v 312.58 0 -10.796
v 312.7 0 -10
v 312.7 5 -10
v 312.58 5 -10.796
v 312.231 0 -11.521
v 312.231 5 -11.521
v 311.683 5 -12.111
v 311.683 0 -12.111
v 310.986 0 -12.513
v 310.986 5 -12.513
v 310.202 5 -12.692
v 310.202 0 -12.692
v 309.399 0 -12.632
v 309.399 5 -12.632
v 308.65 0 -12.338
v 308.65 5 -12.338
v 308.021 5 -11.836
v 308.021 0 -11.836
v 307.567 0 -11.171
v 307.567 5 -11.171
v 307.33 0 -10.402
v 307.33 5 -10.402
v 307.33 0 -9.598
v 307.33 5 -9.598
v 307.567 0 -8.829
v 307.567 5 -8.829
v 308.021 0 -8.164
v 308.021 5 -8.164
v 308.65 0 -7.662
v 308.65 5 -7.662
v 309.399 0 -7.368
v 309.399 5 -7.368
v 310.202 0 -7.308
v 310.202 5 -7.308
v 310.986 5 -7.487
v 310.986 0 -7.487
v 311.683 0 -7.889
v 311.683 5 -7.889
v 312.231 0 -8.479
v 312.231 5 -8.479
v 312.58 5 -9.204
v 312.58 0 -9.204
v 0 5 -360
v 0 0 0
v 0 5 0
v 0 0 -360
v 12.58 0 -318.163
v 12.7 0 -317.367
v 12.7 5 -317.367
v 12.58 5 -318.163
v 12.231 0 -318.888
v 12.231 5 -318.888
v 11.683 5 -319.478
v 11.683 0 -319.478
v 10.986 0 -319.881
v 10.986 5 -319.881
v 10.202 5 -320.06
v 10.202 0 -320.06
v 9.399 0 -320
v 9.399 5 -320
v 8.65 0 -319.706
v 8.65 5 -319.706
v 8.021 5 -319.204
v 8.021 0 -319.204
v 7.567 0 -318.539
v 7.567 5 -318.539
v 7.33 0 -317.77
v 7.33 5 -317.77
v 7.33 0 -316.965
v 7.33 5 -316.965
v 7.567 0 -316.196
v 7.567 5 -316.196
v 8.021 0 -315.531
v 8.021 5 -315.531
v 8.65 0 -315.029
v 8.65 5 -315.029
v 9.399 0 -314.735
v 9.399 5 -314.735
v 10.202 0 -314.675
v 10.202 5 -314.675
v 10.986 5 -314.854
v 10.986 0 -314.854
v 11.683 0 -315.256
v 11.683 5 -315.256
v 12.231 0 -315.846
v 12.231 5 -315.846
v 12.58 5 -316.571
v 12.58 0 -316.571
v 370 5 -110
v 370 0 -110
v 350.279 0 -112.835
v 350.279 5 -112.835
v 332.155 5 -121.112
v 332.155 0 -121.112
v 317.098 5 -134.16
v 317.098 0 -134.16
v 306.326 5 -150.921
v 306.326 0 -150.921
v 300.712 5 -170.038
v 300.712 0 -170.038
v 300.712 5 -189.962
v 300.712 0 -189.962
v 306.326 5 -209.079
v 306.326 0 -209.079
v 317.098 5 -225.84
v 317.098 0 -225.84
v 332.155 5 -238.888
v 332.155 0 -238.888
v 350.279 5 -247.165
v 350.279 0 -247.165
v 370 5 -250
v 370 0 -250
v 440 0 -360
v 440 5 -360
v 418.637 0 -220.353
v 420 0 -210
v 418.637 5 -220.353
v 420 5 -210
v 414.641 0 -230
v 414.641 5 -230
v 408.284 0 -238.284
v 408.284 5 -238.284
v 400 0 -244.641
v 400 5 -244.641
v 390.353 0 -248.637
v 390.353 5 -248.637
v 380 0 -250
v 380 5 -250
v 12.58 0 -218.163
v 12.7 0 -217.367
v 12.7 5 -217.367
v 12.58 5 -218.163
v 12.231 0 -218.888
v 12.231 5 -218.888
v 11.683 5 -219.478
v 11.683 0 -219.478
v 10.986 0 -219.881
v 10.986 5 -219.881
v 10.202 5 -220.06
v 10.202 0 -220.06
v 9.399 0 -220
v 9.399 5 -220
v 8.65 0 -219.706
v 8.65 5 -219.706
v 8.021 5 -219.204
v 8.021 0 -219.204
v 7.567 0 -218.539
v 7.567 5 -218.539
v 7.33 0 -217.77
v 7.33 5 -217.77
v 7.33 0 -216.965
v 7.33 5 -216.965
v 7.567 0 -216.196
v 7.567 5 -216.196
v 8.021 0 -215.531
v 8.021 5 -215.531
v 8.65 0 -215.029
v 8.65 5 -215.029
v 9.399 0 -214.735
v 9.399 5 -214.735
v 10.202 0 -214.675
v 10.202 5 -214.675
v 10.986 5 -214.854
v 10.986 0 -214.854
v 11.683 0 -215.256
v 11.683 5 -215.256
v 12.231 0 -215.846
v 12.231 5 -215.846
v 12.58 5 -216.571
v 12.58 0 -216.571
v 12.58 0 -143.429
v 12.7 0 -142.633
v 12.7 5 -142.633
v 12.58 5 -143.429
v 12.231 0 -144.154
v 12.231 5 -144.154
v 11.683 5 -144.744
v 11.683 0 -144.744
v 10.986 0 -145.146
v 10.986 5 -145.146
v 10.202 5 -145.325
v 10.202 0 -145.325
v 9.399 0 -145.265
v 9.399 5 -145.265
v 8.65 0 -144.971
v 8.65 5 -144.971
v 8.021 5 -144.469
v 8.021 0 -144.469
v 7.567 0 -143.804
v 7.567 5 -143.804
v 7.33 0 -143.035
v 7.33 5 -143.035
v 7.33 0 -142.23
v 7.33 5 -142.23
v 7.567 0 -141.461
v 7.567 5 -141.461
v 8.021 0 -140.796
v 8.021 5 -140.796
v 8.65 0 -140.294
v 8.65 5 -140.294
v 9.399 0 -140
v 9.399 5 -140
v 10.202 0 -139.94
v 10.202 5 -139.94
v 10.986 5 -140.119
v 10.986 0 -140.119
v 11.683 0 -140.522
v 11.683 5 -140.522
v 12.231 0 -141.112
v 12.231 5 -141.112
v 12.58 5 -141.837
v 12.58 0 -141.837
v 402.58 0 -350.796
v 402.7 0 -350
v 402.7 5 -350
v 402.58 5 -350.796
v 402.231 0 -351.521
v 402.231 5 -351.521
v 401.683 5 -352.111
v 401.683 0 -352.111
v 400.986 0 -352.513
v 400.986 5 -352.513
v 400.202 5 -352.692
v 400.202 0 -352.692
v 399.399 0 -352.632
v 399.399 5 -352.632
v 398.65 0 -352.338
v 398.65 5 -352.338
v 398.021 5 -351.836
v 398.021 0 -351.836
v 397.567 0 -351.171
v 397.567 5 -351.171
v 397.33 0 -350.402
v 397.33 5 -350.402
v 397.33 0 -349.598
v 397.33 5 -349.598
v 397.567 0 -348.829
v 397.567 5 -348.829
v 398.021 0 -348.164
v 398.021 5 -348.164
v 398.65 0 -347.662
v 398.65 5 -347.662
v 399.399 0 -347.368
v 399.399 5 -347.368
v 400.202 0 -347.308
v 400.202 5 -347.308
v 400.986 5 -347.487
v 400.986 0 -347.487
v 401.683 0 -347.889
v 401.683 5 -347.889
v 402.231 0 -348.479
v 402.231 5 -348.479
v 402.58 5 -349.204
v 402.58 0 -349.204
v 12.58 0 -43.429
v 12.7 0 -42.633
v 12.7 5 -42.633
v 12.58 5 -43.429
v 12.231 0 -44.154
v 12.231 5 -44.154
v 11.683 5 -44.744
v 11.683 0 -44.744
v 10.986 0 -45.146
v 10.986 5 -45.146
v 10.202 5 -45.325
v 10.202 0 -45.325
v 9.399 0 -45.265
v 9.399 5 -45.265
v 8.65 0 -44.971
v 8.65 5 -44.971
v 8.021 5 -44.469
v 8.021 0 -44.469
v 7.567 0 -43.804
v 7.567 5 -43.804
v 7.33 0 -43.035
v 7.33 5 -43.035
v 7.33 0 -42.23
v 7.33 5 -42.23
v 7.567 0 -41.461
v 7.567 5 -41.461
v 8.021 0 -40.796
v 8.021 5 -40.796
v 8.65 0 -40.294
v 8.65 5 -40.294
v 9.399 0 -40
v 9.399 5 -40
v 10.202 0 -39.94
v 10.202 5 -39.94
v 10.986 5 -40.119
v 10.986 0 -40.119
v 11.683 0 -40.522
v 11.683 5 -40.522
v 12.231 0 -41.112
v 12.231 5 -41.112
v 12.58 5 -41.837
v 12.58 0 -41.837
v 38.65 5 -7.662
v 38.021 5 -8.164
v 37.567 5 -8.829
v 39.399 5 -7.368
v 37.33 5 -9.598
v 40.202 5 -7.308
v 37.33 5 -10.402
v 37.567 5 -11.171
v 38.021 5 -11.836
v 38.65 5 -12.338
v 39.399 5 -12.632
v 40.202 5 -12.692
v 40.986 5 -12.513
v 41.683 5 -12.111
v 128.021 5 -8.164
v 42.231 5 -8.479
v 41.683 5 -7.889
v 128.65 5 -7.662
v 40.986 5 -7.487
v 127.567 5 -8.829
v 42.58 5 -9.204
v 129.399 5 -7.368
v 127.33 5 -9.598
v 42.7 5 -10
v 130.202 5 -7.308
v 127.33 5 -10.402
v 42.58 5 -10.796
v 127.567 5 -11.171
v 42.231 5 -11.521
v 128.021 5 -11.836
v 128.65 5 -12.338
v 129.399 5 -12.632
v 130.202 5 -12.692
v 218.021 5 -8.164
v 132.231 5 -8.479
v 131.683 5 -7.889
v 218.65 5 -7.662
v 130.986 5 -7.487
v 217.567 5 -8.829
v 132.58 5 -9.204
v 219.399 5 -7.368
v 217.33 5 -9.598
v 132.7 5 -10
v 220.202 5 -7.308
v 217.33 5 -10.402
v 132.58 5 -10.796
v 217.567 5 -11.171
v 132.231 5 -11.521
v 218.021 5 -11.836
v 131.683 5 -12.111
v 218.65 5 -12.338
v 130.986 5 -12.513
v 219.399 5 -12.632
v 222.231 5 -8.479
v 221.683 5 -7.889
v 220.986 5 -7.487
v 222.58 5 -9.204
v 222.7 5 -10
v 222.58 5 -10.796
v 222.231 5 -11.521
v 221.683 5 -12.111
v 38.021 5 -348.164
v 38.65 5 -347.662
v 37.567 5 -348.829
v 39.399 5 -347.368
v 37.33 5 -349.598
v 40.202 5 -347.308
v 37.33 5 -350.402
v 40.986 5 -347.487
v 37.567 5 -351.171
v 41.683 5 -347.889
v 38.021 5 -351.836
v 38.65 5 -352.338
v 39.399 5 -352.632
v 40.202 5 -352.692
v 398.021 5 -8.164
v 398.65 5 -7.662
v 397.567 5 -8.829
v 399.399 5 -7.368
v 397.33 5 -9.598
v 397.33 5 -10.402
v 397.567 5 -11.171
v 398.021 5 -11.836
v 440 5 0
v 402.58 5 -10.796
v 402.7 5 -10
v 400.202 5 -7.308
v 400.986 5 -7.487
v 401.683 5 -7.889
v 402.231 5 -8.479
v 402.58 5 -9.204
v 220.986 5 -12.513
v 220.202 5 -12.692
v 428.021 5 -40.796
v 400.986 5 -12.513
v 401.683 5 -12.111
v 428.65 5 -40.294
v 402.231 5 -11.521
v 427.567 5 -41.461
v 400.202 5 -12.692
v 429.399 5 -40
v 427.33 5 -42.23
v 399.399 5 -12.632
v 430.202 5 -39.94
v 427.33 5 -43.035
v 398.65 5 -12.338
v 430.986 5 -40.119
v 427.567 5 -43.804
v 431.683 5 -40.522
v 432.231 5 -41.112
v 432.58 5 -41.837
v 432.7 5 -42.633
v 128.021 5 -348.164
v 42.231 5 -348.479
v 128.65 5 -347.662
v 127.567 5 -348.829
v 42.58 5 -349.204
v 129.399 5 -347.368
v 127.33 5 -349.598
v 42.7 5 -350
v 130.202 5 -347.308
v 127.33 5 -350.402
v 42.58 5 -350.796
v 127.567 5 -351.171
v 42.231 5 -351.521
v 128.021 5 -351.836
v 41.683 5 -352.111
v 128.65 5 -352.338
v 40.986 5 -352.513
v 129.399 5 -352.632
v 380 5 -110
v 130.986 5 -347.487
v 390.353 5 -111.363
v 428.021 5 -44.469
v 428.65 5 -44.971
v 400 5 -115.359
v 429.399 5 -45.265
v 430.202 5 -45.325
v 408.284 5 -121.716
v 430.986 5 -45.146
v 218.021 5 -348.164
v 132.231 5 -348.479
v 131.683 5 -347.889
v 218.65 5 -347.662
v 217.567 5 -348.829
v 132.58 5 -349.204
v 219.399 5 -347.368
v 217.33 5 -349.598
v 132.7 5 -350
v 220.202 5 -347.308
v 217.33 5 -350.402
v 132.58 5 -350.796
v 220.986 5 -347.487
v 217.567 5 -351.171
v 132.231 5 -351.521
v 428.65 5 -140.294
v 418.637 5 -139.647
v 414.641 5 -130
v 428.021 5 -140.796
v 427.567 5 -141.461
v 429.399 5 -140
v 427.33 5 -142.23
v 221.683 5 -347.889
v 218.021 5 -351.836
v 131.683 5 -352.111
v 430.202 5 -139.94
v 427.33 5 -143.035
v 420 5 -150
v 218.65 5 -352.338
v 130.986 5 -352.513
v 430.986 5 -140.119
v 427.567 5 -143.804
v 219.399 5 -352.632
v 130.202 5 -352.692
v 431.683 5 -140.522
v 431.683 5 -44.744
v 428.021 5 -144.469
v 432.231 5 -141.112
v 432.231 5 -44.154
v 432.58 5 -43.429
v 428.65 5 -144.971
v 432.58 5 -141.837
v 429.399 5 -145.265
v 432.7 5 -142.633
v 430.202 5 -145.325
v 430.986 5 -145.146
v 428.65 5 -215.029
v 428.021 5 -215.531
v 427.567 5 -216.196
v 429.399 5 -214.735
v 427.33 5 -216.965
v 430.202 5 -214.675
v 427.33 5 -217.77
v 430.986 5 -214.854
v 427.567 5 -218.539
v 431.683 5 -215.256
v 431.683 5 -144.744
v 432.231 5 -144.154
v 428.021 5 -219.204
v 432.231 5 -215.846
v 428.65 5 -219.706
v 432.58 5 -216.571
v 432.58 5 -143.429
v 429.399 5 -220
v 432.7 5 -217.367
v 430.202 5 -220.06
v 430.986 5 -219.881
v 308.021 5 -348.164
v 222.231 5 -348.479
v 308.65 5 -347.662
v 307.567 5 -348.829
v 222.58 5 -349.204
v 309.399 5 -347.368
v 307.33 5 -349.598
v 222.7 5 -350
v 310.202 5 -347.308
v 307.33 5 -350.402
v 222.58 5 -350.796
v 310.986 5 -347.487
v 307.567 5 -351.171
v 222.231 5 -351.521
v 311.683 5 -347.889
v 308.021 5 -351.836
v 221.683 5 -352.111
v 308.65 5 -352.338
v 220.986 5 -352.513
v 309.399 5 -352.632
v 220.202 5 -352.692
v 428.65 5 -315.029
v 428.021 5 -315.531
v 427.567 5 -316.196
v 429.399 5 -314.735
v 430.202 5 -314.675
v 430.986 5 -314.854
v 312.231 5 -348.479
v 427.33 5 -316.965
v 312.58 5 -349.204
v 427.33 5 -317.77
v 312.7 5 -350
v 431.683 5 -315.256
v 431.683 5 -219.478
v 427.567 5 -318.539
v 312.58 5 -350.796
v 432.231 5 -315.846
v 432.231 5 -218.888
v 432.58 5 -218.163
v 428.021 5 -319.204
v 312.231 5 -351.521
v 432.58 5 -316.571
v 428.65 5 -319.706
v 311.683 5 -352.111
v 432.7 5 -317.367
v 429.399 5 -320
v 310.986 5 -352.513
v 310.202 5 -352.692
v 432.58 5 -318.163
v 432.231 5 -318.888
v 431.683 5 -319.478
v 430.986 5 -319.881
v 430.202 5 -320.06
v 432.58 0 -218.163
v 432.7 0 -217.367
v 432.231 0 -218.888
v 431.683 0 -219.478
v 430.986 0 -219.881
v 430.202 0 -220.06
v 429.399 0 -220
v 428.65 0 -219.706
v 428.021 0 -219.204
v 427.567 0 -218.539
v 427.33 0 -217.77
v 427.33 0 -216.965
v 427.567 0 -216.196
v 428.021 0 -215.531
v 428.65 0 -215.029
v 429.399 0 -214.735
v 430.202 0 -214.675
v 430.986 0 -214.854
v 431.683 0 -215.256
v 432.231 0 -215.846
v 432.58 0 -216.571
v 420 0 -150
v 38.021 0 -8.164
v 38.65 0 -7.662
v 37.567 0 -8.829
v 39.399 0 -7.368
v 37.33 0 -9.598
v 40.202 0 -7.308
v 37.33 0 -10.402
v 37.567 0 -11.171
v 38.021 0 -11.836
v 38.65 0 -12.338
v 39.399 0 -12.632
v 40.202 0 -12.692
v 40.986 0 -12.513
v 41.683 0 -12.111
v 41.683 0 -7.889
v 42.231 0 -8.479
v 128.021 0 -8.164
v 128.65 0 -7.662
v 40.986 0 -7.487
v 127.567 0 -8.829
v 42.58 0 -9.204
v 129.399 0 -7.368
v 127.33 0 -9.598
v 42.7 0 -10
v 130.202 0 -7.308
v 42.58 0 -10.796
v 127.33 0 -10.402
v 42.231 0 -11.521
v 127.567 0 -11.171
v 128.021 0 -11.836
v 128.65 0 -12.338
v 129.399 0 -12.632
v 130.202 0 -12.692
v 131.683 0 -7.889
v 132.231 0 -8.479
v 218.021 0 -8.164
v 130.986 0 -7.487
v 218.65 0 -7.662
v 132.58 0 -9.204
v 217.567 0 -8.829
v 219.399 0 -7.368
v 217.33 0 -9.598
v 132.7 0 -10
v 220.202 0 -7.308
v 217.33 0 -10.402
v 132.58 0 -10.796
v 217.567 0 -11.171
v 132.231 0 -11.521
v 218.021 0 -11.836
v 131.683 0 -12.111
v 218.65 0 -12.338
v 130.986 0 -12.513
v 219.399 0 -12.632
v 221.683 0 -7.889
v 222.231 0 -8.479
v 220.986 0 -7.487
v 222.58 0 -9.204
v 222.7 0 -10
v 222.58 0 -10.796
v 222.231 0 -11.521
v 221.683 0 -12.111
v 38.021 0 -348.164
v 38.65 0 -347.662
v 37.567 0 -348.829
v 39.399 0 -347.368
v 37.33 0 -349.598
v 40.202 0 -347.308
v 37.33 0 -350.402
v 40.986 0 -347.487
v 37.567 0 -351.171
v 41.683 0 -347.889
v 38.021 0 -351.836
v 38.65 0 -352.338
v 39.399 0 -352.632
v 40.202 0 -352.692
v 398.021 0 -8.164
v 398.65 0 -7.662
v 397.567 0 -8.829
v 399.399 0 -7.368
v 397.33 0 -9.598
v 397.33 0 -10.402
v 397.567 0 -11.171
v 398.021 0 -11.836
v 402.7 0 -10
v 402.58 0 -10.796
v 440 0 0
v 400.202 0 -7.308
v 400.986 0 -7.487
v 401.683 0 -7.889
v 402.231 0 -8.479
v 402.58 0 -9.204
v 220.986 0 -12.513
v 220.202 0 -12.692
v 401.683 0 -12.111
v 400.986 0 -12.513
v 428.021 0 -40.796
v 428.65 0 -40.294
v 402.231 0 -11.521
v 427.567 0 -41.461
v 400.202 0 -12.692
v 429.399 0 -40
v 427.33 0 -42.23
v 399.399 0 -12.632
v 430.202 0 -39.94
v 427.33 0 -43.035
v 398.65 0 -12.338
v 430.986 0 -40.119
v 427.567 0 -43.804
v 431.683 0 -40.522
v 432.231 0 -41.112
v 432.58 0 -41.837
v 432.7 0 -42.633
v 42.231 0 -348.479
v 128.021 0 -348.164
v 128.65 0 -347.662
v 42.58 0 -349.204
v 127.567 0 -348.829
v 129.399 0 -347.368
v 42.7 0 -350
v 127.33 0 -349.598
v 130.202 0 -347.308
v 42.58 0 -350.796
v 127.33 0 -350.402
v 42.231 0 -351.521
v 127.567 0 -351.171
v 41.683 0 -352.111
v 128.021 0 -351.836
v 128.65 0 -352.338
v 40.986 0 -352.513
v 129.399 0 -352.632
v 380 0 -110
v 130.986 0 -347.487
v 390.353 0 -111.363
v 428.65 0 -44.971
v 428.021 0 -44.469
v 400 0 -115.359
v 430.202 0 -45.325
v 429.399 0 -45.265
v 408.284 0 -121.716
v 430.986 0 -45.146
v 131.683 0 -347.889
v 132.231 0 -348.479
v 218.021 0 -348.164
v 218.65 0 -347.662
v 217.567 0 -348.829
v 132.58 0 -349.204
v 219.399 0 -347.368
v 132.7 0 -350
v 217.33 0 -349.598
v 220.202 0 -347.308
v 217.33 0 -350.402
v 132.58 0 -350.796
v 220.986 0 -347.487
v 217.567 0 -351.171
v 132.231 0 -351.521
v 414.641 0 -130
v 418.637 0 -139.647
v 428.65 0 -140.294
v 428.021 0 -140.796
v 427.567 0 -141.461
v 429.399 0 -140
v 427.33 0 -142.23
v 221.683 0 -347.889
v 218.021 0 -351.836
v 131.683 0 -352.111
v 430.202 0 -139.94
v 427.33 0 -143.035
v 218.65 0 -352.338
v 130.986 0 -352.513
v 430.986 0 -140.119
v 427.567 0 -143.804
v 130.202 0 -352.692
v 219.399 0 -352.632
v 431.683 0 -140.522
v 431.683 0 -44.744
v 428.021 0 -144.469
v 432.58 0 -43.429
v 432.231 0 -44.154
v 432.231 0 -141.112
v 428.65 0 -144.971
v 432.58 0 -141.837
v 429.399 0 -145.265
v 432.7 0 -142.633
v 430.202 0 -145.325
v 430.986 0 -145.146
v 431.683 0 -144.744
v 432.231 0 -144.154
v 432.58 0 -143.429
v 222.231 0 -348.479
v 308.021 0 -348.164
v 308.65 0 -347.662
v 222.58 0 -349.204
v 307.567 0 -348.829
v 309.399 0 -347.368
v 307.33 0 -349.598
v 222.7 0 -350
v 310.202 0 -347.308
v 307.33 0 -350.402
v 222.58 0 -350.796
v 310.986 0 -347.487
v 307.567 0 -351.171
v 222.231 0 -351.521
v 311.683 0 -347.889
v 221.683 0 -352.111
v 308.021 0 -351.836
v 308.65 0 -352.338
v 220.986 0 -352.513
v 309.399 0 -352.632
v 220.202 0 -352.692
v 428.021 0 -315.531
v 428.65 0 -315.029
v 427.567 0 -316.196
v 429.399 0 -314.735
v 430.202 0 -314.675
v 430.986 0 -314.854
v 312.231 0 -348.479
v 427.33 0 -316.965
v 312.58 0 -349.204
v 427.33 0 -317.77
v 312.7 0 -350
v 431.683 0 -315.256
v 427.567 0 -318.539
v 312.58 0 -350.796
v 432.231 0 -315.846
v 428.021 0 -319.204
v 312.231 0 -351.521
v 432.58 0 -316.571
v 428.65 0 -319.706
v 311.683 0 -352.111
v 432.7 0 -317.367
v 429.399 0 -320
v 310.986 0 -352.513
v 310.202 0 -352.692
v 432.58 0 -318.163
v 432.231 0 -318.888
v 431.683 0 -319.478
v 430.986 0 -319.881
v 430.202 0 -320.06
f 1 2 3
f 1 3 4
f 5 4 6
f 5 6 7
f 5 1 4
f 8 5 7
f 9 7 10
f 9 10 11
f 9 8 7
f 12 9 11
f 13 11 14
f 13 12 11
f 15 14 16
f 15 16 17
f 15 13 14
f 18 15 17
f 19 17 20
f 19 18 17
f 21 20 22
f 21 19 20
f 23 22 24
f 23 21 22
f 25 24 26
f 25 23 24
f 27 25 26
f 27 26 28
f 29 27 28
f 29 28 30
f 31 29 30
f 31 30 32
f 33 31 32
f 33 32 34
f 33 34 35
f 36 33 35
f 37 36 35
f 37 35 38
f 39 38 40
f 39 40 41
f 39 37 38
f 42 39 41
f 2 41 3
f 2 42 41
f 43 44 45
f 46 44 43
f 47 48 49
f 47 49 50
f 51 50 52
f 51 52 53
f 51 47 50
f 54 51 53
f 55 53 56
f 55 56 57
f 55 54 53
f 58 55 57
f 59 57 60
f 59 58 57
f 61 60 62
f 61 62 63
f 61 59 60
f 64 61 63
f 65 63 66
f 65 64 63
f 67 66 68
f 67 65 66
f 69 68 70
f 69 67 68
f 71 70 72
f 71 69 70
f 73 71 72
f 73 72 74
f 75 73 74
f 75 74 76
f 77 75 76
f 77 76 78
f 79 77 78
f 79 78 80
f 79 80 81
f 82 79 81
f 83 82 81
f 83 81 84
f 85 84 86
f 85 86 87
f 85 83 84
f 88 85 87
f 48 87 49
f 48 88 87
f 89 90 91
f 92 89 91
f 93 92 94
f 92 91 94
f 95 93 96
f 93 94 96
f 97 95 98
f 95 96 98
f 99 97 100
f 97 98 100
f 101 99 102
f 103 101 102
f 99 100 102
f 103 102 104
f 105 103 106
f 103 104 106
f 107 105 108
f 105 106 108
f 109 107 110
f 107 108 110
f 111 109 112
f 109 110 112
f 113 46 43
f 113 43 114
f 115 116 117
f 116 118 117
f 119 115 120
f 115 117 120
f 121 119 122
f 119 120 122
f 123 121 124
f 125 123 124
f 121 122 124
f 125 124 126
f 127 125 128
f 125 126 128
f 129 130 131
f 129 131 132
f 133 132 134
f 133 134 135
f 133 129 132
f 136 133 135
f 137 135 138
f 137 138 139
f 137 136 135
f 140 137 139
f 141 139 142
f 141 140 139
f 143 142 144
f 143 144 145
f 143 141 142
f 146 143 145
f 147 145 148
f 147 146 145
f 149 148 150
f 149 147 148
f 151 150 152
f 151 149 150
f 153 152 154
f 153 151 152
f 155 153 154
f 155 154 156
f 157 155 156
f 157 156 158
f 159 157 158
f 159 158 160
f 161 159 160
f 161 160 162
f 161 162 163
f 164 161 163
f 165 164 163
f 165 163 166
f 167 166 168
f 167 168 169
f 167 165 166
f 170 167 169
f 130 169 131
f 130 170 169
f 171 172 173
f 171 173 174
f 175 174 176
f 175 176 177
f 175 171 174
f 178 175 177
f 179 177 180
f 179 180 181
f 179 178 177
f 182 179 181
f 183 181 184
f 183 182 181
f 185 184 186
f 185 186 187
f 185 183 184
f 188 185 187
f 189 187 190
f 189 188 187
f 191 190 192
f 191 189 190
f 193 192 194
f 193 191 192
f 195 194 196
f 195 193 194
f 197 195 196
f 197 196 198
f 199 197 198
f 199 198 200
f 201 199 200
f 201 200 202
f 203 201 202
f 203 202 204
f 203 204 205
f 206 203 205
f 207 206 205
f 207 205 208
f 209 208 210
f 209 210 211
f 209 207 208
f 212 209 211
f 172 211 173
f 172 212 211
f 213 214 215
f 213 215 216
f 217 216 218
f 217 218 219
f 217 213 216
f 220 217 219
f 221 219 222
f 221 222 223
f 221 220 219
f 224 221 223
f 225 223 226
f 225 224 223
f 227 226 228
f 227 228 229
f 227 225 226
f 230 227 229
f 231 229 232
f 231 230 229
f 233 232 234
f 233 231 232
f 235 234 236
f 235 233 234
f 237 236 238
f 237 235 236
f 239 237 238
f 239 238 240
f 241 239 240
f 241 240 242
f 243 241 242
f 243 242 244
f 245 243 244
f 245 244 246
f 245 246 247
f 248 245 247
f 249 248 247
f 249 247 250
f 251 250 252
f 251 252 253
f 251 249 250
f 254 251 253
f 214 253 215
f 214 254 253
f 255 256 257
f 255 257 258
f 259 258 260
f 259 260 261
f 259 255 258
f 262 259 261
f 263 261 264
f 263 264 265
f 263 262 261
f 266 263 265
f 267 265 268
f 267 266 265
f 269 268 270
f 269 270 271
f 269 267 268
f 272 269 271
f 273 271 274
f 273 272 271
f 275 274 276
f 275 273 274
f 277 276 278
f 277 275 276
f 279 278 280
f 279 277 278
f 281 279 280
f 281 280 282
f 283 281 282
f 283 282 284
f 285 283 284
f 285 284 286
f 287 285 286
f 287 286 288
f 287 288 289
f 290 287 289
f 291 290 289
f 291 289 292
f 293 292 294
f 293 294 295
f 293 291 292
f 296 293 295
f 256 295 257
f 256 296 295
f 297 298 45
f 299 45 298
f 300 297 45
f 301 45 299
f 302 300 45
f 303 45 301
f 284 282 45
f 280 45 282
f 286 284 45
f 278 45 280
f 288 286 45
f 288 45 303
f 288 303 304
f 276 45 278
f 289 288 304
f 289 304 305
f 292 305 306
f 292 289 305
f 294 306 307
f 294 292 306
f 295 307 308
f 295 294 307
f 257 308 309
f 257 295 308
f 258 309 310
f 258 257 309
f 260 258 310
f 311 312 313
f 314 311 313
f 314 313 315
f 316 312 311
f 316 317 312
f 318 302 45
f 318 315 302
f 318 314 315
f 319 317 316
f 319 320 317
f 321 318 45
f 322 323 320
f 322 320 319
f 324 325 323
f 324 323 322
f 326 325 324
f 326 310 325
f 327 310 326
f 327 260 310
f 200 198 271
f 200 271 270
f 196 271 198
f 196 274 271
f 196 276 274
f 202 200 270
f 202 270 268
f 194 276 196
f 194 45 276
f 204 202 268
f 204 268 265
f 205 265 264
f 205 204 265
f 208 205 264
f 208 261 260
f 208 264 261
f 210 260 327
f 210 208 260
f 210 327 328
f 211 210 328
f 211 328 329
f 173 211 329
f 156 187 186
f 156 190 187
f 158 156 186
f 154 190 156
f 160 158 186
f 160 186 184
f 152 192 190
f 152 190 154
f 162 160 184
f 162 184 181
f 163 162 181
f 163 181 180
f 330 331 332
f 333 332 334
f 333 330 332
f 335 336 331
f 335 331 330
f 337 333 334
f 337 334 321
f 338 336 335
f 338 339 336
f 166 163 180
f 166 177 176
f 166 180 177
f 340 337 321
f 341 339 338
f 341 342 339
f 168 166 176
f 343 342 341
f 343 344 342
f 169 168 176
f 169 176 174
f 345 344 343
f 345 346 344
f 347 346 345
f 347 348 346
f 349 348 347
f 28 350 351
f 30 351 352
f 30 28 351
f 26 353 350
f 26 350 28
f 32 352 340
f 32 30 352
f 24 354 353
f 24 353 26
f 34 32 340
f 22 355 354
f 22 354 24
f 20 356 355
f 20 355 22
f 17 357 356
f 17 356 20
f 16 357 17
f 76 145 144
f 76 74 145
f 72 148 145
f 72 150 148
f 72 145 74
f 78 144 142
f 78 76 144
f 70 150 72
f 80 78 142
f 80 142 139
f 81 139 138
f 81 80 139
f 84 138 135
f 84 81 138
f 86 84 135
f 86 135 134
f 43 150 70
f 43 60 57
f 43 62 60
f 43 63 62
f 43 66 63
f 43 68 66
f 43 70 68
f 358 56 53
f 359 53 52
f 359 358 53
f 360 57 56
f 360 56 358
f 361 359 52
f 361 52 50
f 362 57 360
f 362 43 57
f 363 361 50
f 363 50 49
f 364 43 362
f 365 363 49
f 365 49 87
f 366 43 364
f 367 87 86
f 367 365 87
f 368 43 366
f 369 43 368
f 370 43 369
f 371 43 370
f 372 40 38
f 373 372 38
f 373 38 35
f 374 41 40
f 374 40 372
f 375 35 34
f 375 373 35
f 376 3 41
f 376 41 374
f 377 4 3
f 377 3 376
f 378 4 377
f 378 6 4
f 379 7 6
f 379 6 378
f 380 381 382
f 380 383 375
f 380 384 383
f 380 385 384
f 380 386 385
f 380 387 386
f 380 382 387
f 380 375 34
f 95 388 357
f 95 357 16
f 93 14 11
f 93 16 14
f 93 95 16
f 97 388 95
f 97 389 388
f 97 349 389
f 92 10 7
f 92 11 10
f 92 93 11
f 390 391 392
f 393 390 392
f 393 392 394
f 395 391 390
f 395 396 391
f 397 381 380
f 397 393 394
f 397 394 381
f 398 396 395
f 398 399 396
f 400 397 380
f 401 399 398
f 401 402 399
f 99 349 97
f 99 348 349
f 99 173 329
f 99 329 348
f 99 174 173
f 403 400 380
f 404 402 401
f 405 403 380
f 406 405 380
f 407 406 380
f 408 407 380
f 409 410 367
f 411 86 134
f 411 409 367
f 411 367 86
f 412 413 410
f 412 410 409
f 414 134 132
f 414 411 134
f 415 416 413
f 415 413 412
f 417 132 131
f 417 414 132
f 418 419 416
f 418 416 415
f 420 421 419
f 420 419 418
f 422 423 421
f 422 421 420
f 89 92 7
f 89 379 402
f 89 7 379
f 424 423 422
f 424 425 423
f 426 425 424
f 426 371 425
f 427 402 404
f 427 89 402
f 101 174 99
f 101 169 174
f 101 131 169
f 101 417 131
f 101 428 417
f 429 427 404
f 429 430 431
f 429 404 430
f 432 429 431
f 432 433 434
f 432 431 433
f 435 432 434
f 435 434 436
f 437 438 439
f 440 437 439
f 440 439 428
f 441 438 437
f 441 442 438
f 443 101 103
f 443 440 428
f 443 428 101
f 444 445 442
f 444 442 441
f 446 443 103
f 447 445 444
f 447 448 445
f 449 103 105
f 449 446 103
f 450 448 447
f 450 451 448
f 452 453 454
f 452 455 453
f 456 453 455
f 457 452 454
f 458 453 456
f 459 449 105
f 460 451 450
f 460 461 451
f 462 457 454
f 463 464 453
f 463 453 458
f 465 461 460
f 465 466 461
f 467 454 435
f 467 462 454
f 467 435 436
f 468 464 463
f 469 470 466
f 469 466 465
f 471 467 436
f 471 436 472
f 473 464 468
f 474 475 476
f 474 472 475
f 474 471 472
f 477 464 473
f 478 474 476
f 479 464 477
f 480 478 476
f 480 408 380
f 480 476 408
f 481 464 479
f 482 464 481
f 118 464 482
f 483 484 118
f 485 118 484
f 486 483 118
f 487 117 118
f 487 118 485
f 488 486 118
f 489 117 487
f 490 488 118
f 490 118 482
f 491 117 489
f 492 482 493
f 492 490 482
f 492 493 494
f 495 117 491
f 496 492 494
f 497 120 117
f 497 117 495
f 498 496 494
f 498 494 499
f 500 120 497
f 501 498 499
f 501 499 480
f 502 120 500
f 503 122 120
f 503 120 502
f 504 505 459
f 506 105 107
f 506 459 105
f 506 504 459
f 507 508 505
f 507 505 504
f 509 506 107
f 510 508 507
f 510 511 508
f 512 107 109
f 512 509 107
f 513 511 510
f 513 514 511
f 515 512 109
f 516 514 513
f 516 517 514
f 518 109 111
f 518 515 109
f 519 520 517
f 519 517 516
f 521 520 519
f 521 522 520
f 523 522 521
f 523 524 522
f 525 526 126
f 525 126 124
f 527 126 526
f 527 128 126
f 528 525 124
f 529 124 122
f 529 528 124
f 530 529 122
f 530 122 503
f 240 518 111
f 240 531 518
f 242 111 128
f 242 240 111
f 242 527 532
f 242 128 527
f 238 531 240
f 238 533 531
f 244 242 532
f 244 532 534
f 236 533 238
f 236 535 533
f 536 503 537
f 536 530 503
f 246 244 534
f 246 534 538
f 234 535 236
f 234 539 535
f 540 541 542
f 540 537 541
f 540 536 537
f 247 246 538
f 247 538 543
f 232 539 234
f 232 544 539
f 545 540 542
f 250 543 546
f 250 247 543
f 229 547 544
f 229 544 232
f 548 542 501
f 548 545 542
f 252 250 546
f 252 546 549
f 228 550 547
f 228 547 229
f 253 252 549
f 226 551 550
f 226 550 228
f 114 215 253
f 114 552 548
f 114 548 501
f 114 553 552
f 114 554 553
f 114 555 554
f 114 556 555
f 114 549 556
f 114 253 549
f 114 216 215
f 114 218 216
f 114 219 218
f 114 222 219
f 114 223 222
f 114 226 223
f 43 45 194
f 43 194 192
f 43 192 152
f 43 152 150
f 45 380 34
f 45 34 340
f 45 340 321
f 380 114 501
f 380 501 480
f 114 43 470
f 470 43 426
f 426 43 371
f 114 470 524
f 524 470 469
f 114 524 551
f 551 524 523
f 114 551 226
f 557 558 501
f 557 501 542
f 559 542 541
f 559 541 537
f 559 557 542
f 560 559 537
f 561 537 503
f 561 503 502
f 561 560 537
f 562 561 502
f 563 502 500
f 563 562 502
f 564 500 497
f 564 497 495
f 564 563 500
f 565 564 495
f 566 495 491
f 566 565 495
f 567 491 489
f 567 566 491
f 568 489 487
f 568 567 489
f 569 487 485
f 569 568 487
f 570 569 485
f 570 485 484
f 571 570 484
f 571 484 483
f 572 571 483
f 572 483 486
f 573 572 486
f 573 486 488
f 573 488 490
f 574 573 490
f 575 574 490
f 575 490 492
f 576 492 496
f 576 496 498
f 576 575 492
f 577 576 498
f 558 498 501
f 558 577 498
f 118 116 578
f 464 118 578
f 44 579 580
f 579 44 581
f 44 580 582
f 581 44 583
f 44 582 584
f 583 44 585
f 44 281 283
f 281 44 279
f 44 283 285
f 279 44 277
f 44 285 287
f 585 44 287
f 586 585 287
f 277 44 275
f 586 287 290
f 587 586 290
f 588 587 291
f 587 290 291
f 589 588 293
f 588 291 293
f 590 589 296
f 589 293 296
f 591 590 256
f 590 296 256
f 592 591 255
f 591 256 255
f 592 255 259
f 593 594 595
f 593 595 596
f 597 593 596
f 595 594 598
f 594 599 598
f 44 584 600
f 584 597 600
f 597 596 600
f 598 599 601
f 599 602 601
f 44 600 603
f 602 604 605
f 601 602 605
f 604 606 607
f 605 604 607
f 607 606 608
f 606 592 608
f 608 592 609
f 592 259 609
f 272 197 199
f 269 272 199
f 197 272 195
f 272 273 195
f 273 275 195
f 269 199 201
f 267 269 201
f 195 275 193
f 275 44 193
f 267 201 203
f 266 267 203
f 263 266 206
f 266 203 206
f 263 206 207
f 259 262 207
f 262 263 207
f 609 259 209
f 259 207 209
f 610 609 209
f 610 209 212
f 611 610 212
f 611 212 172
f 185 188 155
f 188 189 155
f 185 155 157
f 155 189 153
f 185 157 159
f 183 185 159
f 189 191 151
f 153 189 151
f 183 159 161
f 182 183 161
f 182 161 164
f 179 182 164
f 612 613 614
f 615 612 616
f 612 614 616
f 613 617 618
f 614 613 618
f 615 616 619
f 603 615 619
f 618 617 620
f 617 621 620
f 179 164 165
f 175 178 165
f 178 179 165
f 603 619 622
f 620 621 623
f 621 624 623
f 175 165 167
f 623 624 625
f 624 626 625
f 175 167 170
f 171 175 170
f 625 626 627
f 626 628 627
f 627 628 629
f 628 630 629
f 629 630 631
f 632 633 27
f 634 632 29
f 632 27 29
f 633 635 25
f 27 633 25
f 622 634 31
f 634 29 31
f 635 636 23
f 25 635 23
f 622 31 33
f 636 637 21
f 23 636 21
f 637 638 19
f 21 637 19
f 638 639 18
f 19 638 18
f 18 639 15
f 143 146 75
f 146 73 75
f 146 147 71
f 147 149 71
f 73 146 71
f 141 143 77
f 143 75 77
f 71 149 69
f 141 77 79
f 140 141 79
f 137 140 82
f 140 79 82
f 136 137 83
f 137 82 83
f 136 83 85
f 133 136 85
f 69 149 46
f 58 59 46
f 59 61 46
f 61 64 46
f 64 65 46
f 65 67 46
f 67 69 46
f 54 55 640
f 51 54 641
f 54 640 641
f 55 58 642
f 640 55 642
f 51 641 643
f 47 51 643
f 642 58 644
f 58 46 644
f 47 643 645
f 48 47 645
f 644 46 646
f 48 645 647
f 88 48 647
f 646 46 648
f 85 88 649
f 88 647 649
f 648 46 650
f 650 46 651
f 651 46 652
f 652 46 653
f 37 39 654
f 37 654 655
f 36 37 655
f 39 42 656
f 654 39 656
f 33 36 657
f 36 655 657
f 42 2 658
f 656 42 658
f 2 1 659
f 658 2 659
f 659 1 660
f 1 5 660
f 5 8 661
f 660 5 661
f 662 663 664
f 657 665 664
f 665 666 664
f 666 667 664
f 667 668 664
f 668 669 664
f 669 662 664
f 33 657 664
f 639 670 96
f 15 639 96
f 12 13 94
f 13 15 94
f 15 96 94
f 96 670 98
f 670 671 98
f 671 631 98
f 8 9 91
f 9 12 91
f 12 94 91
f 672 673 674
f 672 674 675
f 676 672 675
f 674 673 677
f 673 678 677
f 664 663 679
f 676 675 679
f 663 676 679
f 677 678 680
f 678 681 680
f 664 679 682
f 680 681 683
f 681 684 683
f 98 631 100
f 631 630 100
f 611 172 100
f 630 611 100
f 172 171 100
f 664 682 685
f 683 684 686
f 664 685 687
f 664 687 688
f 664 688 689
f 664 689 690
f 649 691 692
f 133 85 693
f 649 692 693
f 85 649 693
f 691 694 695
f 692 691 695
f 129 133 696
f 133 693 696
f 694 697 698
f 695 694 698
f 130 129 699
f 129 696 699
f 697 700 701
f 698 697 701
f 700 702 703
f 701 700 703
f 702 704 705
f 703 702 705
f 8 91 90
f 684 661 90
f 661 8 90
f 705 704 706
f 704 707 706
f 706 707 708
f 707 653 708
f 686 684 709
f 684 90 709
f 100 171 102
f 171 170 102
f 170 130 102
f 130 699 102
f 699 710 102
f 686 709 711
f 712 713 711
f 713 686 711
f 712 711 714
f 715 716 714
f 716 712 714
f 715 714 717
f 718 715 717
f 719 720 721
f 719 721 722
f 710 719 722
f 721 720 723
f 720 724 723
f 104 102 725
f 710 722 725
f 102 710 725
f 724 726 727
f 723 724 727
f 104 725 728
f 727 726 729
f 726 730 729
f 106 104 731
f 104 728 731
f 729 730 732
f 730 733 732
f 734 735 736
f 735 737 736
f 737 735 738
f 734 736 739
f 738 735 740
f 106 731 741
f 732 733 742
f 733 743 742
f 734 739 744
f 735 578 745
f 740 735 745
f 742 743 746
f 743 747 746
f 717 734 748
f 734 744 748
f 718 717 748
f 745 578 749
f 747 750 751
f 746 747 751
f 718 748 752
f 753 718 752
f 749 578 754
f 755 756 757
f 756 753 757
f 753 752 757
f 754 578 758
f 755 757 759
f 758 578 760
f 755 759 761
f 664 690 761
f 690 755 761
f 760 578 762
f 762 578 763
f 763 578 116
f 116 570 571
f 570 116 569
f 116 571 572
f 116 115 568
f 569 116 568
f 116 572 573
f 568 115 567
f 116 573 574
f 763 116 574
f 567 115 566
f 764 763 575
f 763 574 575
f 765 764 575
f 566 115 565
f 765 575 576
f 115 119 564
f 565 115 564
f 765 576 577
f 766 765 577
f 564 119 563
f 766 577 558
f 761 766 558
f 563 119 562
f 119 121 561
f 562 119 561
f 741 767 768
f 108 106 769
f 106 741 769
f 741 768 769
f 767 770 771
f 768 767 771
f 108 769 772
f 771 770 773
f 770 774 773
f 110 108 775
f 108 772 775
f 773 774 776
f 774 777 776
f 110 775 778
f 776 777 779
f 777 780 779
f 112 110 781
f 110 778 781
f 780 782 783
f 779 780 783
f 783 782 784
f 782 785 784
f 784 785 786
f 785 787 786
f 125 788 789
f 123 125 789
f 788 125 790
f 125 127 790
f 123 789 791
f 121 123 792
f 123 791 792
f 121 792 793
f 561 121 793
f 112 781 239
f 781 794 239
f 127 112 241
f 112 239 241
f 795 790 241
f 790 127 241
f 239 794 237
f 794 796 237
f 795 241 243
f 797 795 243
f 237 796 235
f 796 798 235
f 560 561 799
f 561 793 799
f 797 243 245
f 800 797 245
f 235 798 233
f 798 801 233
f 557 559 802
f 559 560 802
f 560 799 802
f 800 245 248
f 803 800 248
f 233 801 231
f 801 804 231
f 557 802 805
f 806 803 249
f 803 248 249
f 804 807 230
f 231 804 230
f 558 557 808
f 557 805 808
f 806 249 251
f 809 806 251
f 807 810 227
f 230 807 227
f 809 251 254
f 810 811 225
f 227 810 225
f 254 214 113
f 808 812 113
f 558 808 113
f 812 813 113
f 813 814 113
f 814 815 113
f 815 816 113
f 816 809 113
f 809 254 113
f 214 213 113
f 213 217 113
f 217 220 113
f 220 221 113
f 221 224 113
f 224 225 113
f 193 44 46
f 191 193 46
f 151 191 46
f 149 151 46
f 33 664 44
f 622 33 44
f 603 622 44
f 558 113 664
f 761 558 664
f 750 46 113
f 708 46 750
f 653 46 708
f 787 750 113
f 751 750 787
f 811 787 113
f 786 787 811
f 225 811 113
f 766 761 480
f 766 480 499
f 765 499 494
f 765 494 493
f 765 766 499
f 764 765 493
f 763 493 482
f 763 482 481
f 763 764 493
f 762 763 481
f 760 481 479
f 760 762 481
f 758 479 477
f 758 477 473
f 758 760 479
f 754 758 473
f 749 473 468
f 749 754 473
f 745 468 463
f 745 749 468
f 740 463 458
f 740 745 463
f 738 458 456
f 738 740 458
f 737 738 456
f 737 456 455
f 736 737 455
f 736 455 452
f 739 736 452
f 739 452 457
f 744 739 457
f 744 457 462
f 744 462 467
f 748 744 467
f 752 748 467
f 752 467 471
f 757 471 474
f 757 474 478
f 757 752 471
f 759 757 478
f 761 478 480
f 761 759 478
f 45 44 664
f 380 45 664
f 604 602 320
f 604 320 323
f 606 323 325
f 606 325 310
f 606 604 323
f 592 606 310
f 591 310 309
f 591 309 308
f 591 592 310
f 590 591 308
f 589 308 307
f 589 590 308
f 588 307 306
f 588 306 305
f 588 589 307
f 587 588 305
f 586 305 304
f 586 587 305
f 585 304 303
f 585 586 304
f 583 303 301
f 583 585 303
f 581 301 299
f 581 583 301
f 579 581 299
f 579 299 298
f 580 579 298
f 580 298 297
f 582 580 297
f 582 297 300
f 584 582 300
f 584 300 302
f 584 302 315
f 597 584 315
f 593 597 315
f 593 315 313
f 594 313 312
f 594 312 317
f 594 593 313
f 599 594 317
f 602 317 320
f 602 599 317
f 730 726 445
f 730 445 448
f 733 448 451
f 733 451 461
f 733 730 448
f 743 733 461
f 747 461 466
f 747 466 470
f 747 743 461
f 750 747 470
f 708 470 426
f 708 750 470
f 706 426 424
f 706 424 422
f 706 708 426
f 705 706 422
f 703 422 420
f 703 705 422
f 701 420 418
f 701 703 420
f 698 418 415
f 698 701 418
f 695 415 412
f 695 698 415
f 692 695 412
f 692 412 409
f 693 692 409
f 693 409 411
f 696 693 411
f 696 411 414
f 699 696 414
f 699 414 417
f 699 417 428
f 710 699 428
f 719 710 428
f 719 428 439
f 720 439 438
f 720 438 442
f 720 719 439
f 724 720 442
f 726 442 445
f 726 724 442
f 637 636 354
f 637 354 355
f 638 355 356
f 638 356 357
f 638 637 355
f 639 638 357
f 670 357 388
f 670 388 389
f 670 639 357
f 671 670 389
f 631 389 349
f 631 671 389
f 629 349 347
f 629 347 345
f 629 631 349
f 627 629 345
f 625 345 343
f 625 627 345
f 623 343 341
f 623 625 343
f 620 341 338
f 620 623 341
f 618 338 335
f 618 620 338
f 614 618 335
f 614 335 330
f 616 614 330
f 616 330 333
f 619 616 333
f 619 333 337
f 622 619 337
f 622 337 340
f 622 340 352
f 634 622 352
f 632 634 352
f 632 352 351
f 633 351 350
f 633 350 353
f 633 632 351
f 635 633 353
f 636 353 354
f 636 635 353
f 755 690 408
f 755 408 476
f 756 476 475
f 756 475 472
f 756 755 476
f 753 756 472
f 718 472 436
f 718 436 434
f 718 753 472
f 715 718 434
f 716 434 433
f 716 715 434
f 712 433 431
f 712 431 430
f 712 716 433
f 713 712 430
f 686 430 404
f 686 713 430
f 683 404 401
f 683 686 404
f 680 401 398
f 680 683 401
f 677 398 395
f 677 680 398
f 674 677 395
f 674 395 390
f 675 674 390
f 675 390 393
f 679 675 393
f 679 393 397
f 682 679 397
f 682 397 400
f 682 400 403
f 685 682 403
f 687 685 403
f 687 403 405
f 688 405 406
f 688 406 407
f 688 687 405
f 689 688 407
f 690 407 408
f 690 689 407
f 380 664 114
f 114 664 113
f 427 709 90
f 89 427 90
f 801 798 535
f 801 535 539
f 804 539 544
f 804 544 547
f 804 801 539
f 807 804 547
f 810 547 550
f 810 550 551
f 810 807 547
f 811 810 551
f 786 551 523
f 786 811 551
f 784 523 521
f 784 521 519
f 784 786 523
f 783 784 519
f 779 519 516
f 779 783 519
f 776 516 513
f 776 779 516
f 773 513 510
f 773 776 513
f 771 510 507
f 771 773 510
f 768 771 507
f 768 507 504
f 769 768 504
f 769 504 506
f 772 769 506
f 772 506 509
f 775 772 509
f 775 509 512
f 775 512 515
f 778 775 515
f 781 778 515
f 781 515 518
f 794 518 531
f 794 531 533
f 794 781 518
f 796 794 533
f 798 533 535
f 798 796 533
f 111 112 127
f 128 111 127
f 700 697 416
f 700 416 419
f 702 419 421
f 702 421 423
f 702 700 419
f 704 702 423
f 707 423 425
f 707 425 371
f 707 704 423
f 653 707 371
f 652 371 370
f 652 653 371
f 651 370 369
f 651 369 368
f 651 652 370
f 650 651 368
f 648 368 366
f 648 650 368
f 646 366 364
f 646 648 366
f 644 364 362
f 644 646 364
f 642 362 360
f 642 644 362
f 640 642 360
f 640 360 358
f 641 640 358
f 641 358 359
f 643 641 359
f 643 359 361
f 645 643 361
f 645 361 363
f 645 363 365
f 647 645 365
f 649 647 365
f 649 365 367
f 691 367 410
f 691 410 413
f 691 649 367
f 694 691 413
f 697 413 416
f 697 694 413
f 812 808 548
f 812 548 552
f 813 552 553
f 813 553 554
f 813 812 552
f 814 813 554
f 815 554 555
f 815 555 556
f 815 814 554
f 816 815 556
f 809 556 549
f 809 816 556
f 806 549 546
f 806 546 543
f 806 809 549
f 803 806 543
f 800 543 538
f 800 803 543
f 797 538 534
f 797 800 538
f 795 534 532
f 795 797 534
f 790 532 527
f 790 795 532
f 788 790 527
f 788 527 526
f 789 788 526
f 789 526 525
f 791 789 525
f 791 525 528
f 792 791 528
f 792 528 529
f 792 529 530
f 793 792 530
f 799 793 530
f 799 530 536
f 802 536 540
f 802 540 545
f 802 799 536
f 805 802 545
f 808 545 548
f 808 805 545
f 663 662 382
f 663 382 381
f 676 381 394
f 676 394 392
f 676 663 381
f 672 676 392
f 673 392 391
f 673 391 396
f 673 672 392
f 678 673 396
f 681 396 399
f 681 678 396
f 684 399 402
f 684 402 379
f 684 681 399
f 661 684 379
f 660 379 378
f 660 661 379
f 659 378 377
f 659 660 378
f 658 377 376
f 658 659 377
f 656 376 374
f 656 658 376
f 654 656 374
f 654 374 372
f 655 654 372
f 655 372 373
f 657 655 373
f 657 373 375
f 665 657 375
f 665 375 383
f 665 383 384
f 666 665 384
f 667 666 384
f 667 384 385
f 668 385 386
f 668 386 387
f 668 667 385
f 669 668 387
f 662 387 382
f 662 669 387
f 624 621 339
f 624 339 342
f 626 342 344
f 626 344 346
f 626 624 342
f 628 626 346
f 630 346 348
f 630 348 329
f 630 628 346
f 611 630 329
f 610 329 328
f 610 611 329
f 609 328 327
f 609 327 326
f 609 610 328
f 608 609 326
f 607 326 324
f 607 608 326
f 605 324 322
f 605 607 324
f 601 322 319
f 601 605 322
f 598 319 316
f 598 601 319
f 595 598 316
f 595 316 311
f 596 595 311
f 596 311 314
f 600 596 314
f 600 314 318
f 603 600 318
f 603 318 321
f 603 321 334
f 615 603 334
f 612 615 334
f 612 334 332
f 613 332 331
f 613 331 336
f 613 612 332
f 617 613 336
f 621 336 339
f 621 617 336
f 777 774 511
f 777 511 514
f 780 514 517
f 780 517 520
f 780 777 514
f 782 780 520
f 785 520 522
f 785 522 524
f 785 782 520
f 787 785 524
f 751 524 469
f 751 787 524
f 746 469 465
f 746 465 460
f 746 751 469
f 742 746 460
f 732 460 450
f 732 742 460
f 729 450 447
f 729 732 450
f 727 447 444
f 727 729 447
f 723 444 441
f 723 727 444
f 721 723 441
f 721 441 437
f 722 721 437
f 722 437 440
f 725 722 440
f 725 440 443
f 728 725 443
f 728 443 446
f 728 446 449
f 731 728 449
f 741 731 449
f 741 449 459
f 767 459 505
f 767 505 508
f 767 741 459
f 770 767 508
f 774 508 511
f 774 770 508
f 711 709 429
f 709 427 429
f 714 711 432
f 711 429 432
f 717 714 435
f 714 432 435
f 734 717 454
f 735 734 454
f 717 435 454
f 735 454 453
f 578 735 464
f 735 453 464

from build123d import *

# Parameters (mm, degrees)
ESQUISSE1_W        = 440
ESQUISSE1_H        = 360
ESQUISSE1_R        = 2.7
BOSS_EXTRU_1_DEPTH = 5
CONG_1_R           = 40


with BuildPart() as part:
    # Esquisse1 → Boss.-Extru.1 (new body)
    with BuildSketch(Plane(origin=(0, 0, 0), x_dir=(1, 0, 0), z_dir=(0, 1, 0))):
        with Locations((220, 180)):
            Rectangle(ESQUISSE1_W, ESQUISSE1_H)
        with Locations((40, 350)):
            Circle(ESQUISSE1_R, mode=Mode.SUBTRACT)
        with Locations((130, 350)):
            Circle(ESQUISSE1_R, mode=Mode.SUBTRACT)
        with Locations((220, 350)):
            Circle(ESQUISSE1_R, mode=Mode.SUBTRACT)
        with Locations((310, 350)):
            Circle(ESQUISSE1_R, mode=Mode.SUBTRACT)
        with Locations((400, 350)):
            Circle(ESQUISSE1_R, mode=Mode.SUBTRACT)
        with Locations((400, 10)):
            Circle(ESQUISSE1_R, mode=Mode.SUBTRACT)
        with Locations((310, 10)):
            Circle(ESQUISSE1_R, mode=Mode.SUBTRACT)
        with Locations((220, 10)):
            Circle(ESQUISSE1_R, mode=Mode.SUBTRACT)
        with Locations((130, 10)):
            Circle(ESQUISSE1_R, mode=Mode.SUBTRACT)
        with Locations((40, 10)):
            Circle(ESQUISSE1_R, mode=Mode.SUBTRACT)
        with Locations((10, 217.36725867)):
            Circle(ESQUISSE1_R, mode=Mode.SUBTRACT)
        with Locations((10, 317.36725867)):
            Circle(ESQUISSE1_R, mode=Mode.SUBTRACT)
        with Locations((10, 42.63274133)):
            Circle(ESQUISSE1_R, mode=Mode.SUBTRACT)
        with Locations((10, 142.63274133)):
            Circle(ESQUISSE1_R, mode=Mode.SUBTRACT)
        with Locations((430, 142.63274133)):
            Circle(ESQUISSE1_R, mode=Mode.SUBTRACT)
        with Locations((430, 42.63274133)):
            Circle(ESQUISSE1_R, mode=Mode.SUBTRACT)
        with Locations((430, 317.36725867)):
            Circle(ESQUISSE1_R, mode=Mode.SUBTRACT)
        with Locations((430, 217.36725867)):
            Circle(ESQUISSE1_R, mode=Mode.SUBTRACT)
        with BuildLine():
            Line((370, 250), (420, 250))
            Line((420, 250), (420, 110))
            Line((420, 110), (370, 110))
            ThreePointArc((370, 110), (300, 180), (370, 250))
        make_face(mode=Mode.SUBTRACT)
    extrude(amount=BOSS_EXTRU_1_DEPTH)

    # Congé1
    cong_1_edges = [part.edges().sort_by_distance(p)[0] for p in [
        (420, 2.5, -110),
        (420, 2.5, -250),
    ]]
    fillet(cong_1_edges, radius=CONG_1_R)


solid = part.part
